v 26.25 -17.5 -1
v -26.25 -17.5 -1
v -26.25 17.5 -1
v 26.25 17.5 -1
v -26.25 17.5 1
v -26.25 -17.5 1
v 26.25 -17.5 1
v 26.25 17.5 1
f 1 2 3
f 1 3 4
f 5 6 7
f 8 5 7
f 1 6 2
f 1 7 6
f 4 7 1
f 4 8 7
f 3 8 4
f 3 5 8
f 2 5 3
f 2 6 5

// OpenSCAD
// file: shaft_mount_func.scad
echo(version=version());

transblue = [0.5,0.5,0.9,0.8];

cylWidth = 20;
cylThick = 6.5;

// Create case for "Make a bracket" from bunnings warehouse
//cyl_rail_case(56, 20, 8.5, 2);
// Create plug for above case
//mab_rail_case_plug(56,20,2);

module cyl_rail_case_plug(intwidth, intlength, thickness)
// Subsection plug for case
color("green") 
    translate([0,0,-1])
    linear_extrude(height=thickness)
        square([intwidth,intlength], center= true);


module cyl_rail_case(intwidth, intlength, intheight, thickness) {
// Case primary
    
outerlength = intlength + (thickness*2);
outerwidth = intwidth + (thickness*2);
outerheight = intheight + (thickness*2);

union() {

difference() {
union() {
translate([0,(intlength+thickness)/2,-(thickness+1+cylThick)])
linear_extrude(height=thickness + cylThick)
square(size=[(cylWidth + (thickness*2)),thickness], center=true);

translate([0,-(intlength+thickness)/2,-(thickness+1+cylThick)])
linear_extrude(height=thickness + cylThick)
square(size=[(cylWidth + (thickness*2)),thickness], center=true);
}

// For a cylindrical section mount
translate([0,intlength,-2-cylThick/2])
rotate([90,0,0])
linear_extrude(height=intlength*2)
circle(cylThick/2, $fn=50, center=true);

}


// Main section
difference() {
color(transblue)
    translate([0,0,-1])
        linear_extrude(height=intheight+thickness)
            square([outerwidth, outerlength], center=true);
color("red") 
    translate([0,0,-2])
    linear_extrude(height=intheight)
        square([intwidth,intlength], center= true);
        
color("black")
    translate([0,outerlength/2-thickness/2,-1])
    linear_extrude(height=4)
        square([10,3], center=true);
}
}

}
// main file
use <shaft_mount_func.scad>

cyl_rail_case_plug(52.5,35,2);
